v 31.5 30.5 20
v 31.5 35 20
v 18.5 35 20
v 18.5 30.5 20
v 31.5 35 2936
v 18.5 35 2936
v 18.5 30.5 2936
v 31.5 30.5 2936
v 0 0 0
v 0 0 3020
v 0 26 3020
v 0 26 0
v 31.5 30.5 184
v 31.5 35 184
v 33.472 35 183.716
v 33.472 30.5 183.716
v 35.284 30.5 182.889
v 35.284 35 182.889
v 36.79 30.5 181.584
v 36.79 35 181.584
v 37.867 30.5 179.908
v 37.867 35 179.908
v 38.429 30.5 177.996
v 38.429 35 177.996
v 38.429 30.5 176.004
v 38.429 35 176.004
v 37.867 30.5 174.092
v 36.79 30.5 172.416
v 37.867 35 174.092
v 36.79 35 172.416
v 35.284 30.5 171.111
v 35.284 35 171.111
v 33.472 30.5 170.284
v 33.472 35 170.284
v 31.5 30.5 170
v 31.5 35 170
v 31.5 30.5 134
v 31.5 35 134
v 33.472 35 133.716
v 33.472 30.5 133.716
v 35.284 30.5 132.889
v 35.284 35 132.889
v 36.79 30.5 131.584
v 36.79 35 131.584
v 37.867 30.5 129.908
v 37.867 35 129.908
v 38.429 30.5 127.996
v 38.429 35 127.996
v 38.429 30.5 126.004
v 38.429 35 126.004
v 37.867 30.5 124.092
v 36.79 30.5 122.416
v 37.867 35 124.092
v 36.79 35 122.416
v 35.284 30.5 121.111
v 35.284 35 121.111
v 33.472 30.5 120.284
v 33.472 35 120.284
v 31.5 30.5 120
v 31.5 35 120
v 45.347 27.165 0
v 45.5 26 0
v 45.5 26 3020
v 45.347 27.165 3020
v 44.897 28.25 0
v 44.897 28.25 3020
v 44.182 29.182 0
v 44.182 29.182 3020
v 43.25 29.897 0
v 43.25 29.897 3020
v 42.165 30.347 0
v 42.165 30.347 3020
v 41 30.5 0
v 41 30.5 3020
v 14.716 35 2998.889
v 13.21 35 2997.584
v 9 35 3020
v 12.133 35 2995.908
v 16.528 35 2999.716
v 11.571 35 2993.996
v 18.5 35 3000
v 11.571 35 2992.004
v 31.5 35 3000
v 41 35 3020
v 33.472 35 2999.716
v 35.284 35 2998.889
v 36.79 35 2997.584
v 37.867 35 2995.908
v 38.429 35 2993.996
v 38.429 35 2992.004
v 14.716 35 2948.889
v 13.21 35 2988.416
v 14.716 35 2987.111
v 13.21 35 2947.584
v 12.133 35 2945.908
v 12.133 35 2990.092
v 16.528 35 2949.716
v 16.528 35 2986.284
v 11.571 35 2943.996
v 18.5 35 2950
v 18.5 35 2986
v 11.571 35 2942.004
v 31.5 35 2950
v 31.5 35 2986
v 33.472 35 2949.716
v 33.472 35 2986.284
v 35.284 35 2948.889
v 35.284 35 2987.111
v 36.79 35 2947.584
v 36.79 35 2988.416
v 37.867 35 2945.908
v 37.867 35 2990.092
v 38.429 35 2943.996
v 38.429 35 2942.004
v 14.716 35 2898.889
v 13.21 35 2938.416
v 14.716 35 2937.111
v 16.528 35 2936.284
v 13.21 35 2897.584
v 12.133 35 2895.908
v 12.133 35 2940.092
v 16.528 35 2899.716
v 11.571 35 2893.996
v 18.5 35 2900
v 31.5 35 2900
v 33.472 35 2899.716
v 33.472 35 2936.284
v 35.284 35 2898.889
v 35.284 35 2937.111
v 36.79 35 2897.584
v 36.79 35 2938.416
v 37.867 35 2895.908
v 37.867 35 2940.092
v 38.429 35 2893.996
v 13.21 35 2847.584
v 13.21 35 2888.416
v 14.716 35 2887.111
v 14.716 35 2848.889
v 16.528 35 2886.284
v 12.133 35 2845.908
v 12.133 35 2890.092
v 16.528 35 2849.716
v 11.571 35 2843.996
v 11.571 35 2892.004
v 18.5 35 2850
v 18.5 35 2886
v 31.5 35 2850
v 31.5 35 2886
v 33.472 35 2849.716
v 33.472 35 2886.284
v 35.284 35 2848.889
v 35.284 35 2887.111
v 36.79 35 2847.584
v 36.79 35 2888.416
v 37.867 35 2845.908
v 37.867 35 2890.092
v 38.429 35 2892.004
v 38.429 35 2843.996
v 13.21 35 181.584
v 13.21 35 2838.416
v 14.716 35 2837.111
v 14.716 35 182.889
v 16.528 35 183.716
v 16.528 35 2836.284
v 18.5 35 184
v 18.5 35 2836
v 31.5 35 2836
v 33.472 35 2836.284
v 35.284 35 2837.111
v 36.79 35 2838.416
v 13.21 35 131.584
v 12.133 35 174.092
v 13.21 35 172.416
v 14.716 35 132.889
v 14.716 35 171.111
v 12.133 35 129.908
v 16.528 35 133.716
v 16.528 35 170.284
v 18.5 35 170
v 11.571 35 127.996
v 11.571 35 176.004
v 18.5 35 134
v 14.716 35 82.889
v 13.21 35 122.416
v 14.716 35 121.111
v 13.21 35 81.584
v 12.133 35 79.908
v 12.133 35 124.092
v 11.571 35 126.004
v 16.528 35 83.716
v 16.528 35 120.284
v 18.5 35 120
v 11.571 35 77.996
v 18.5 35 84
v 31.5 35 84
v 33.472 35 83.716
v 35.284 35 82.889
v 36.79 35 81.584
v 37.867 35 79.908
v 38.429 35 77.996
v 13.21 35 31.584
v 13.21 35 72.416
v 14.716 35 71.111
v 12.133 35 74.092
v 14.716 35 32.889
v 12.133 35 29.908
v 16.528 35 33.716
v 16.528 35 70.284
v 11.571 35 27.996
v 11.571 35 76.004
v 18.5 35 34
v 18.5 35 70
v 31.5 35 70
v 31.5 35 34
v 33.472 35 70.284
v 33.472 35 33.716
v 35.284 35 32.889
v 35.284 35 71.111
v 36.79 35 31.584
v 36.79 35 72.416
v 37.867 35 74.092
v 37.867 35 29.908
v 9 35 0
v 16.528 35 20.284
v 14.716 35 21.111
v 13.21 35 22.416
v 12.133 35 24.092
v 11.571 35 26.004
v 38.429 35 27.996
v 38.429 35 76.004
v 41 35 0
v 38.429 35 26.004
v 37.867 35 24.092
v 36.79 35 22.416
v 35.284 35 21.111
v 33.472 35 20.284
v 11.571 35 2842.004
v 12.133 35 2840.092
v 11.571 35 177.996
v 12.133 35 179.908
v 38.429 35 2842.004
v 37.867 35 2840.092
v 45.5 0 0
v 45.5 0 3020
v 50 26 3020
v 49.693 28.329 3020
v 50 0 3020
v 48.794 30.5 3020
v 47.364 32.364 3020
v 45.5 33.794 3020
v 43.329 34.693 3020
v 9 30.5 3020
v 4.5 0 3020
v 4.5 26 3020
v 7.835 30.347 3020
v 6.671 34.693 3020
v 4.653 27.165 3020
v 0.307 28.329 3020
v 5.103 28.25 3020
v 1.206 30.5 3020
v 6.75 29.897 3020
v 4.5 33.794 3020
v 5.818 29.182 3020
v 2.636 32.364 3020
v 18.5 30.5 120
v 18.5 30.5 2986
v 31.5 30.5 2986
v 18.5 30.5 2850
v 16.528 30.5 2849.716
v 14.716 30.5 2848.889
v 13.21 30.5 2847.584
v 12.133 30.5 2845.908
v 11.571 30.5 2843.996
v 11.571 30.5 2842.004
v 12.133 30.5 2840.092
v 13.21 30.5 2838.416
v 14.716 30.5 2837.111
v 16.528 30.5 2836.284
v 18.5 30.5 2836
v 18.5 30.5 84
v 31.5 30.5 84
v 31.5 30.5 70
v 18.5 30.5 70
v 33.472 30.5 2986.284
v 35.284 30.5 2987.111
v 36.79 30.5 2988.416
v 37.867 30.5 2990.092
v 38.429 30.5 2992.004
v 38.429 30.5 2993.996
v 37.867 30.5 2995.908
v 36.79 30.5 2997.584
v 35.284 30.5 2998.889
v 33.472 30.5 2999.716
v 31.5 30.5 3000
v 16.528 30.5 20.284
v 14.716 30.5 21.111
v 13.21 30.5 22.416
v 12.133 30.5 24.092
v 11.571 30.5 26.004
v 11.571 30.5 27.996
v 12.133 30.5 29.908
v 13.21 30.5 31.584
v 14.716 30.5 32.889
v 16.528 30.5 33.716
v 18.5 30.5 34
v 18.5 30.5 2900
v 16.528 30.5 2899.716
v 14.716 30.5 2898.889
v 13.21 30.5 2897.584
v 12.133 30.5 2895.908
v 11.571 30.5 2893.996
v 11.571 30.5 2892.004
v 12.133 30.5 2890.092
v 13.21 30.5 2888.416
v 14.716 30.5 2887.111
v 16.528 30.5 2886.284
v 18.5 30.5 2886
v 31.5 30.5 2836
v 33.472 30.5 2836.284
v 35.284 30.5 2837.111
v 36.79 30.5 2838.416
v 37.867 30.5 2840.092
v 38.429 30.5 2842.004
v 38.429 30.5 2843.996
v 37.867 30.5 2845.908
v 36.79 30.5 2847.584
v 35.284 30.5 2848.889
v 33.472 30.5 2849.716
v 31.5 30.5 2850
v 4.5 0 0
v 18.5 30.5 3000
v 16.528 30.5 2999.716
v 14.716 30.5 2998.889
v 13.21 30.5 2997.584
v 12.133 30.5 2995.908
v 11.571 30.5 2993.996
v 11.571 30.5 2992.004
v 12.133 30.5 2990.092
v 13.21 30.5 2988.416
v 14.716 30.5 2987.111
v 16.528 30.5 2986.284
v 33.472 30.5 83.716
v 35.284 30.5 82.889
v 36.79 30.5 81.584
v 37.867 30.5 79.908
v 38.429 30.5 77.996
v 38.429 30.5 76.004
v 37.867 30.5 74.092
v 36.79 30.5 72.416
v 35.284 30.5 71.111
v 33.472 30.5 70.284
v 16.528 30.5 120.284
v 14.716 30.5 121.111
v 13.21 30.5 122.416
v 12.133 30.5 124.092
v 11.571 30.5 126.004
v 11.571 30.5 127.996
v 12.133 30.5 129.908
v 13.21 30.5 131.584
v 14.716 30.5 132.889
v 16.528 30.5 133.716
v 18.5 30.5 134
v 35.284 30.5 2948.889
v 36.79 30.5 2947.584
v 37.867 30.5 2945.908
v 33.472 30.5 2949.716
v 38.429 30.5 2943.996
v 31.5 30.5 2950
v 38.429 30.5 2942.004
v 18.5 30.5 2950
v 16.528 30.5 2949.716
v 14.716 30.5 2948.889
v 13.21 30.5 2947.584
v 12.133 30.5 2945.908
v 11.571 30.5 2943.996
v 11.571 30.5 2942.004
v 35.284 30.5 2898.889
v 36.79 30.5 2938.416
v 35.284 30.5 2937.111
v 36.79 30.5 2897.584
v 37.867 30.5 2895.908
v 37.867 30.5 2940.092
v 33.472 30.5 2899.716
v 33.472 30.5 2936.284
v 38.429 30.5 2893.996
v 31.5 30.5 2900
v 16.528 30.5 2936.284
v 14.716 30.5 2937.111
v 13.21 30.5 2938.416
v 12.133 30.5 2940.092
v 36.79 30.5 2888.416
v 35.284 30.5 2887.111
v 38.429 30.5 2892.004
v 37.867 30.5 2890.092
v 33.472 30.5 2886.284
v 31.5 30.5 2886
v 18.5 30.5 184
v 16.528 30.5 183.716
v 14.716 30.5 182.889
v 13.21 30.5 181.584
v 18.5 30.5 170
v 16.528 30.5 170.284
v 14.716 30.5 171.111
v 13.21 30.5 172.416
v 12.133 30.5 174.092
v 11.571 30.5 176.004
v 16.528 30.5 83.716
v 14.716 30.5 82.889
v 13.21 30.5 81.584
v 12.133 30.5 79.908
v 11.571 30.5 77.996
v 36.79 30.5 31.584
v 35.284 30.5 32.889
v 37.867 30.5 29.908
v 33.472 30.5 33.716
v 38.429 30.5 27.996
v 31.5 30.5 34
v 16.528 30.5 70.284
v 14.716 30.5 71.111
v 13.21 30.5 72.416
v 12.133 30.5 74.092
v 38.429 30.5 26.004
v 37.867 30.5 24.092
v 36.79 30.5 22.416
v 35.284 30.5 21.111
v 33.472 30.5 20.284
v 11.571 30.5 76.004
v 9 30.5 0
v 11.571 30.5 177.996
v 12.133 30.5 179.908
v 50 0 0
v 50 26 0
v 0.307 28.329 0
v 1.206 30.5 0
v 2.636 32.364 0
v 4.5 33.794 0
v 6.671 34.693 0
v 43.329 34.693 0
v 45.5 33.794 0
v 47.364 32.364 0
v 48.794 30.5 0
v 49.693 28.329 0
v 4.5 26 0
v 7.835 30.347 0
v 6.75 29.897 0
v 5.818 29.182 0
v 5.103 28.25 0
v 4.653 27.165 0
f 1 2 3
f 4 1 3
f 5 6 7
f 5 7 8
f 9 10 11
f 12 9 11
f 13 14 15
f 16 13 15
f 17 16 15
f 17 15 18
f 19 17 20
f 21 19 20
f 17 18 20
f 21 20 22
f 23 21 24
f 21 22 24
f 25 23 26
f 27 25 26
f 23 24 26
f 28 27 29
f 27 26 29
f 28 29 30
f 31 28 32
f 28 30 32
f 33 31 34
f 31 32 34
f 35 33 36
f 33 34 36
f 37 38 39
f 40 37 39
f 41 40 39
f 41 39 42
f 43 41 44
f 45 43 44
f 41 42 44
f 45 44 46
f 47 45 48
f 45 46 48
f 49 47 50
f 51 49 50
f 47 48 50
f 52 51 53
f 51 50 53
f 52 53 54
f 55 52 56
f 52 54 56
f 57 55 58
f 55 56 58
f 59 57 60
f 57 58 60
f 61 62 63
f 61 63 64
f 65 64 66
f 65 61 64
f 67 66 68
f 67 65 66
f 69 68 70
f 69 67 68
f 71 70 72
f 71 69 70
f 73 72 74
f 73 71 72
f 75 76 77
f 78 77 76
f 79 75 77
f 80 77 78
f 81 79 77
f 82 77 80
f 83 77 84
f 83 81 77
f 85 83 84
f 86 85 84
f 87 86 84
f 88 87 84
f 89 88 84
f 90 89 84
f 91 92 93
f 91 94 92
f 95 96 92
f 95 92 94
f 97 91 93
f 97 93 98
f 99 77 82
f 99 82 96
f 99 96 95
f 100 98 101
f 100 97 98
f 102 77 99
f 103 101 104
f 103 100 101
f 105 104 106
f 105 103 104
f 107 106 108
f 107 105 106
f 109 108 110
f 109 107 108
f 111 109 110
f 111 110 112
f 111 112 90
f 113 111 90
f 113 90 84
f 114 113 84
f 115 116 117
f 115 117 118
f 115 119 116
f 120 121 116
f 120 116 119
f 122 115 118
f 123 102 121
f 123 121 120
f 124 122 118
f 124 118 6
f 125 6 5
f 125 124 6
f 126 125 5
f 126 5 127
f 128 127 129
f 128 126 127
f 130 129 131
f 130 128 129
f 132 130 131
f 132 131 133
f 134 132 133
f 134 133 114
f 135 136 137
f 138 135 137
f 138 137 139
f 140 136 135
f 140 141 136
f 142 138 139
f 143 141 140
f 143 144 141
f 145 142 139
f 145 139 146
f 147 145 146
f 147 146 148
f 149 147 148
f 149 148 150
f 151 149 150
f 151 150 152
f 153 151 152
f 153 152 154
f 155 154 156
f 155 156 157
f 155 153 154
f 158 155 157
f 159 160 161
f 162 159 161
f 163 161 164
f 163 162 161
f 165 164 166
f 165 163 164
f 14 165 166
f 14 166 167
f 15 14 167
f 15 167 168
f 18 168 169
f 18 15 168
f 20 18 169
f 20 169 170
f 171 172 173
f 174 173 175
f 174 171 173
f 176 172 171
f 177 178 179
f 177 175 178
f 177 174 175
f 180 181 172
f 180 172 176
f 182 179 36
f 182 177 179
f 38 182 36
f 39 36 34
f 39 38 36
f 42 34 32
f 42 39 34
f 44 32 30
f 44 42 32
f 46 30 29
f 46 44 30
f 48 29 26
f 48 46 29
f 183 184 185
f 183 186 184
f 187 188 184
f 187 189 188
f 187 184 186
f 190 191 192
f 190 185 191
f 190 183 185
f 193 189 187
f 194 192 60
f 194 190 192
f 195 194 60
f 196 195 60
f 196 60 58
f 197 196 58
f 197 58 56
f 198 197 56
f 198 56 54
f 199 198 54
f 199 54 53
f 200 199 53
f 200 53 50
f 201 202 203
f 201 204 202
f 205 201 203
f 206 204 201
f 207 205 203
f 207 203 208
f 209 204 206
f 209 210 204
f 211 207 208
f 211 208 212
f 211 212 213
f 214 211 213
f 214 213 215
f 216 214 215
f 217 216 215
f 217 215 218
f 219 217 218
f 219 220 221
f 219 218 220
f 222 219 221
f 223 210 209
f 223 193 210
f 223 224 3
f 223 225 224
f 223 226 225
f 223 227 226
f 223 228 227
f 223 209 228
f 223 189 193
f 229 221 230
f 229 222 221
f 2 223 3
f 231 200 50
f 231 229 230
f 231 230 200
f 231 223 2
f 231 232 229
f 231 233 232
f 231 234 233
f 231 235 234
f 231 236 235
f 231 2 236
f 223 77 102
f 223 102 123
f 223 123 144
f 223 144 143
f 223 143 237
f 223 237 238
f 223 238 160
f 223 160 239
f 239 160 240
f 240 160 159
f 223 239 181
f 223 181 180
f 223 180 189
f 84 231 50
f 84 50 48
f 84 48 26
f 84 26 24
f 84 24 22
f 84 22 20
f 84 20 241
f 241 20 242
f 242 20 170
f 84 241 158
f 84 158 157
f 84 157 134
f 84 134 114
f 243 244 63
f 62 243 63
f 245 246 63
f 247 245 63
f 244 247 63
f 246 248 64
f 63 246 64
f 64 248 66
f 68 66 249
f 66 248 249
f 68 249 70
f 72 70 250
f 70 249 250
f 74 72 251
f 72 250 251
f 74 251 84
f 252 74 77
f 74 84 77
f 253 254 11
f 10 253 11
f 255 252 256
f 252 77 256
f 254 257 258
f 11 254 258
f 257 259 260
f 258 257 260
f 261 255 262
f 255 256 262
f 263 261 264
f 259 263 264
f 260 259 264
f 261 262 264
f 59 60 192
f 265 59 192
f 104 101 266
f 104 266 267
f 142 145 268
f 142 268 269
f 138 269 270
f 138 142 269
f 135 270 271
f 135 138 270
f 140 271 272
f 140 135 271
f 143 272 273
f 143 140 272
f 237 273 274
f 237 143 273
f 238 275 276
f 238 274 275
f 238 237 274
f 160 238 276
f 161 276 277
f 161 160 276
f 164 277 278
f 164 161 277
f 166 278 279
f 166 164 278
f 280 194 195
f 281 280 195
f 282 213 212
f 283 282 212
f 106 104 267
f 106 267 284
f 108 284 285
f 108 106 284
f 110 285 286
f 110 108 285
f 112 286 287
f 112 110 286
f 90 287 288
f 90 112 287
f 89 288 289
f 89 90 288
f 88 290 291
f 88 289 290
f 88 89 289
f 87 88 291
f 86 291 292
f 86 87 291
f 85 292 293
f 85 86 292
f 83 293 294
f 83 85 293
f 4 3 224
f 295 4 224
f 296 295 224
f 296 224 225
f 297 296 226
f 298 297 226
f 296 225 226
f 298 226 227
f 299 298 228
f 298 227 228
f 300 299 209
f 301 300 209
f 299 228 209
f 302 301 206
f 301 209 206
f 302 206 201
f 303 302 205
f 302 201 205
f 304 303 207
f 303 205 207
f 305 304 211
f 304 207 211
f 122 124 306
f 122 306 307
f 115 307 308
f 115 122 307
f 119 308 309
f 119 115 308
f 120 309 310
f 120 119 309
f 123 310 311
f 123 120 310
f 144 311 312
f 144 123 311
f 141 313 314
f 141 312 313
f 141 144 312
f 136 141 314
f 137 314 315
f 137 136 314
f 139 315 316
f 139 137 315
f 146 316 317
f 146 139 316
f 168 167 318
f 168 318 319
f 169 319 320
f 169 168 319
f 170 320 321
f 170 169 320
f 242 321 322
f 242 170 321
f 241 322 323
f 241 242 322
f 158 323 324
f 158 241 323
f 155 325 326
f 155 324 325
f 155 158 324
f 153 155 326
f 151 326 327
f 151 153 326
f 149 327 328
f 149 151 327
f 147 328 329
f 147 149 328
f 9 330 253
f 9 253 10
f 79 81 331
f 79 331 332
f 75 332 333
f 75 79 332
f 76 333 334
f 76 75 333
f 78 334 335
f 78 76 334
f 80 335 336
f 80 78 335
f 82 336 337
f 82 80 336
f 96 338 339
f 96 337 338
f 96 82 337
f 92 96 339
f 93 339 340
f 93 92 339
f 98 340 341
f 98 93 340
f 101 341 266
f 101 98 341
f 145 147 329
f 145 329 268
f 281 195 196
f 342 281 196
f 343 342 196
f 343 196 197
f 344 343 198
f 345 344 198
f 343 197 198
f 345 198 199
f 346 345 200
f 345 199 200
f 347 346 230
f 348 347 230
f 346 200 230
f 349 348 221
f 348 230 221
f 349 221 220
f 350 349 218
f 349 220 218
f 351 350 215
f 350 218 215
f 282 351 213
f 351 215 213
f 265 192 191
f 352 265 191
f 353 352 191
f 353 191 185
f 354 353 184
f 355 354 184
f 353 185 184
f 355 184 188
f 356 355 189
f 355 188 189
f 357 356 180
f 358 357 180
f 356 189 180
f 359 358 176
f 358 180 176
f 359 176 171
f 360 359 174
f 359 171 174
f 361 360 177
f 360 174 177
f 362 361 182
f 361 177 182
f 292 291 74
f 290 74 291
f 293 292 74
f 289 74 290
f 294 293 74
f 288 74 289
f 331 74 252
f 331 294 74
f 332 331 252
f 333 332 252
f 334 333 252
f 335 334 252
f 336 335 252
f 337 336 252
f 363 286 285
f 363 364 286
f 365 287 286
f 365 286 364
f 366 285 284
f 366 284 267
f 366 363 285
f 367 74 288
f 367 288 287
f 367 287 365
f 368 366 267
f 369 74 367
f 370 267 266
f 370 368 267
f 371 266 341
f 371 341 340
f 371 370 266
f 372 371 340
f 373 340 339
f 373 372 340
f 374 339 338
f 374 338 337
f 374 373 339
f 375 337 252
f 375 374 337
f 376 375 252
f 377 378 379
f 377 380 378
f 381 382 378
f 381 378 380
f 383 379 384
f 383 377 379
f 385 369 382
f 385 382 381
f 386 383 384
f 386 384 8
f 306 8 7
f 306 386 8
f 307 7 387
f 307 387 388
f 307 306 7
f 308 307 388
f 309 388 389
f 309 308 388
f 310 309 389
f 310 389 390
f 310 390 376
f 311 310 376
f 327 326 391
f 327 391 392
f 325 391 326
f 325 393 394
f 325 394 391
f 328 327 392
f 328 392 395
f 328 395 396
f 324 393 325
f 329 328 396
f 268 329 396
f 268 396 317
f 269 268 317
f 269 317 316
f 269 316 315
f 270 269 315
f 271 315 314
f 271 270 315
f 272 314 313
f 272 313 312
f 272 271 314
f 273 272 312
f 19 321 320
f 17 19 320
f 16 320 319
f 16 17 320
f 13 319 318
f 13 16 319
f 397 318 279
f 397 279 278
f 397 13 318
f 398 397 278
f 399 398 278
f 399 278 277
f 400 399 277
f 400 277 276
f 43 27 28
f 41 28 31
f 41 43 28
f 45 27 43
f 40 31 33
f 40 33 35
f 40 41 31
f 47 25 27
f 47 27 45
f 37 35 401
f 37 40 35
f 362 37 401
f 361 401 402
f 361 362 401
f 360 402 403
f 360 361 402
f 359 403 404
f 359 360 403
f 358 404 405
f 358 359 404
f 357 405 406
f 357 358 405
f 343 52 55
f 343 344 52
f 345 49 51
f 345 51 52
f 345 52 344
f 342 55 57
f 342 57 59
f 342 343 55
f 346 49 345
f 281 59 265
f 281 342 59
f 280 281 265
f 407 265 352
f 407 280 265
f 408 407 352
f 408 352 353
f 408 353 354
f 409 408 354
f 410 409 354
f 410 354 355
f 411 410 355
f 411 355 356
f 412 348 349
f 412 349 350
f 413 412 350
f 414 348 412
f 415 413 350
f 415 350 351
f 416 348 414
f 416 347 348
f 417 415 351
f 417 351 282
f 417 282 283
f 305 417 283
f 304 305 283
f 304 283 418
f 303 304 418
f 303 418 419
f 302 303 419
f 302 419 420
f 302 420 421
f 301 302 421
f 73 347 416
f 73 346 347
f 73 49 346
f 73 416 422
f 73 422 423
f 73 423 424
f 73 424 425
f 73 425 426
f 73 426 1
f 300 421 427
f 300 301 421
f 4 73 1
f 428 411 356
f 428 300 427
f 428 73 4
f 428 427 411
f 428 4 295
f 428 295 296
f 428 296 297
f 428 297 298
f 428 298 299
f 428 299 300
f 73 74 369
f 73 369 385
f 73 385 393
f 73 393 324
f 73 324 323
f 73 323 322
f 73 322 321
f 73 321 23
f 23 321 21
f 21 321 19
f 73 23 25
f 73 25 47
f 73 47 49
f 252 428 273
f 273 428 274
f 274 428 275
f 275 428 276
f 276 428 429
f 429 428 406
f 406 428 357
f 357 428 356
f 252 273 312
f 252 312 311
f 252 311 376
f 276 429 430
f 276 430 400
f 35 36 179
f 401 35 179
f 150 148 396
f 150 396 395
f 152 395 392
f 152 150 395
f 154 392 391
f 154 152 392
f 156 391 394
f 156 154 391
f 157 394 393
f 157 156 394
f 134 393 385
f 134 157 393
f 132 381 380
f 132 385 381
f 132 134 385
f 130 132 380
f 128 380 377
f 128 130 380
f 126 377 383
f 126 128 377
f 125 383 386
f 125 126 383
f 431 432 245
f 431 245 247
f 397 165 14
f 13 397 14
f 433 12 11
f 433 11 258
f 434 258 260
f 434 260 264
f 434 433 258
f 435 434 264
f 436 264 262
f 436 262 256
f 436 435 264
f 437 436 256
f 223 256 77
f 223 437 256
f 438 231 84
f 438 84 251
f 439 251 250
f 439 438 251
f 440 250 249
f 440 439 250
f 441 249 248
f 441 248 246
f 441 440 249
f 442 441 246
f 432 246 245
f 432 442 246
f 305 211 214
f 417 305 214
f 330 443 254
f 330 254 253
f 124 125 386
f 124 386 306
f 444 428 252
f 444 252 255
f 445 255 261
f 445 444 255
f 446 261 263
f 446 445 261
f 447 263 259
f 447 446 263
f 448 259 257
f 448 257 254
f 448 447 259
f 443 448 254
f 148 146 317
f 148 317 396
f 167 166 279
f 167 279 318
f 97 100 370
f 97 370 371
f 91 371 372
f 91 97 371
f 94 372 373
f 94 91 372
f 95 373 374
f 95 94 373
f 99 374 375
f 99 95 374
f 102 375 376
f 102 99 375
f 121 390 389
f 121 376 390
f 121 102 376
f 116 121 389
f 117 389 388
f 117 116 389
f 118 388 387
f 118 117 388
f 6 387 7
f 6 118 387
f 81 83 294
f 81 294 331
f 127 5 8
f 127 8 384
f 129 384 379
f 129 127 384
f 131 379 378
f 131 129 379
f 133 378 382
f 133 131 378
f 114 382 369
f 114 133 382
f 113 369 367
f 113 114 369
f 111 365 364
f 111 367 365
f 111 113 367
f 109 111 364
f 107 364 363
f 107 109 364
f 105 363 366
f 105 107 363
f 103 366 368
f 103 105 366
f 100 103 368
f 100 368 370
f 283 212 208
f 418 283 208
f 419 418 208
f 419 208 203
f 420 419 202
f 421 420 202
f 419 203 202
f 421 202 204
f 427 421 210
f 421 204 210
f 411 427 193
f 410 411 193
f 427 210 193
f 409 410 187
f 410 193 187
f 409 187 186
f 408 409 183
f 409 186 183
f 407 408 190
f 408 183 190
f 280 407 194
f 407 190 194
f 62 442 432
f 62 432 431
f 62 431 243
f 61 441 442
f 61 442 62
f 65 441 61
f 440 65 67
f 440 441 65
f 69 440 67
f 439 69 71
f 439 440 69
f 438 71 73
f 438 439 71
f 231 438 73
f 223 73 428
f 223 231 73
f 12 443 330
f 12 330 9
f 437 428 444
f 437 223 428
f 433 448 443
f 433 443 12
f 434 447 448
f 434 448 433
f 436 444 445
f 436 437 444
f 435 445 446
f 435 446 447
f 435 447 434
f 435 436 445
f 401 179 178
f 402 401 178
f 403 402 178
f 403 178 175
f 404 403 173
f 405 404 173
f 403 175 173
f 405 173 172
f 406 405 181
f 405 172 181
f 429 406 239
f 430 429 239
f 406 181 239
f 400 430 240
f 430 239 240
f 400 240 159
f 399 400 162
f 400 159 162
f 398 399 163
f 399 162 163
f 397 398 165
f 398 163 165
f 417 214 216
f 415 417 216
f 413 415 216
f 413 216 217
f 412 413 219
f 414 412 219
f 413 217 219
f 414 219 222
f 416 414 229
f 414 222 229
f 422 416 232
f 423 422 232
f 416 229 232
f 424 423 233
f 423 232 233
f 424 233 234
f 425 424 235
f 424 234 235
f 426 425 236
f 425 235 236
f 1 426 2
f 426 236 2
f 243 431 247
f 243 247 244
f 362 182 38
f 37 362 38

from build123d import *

# Parameters (mm, degrees)
BASE_FLANGE1_DEPTH = 3020
CUT_EXTRUDE1_DEPTH = 3021.616658896


# Sheet-metal steps are written as plain solids
with BuildPart() as part:
    # Sketch1 → Base-Flange1 (new body)
    with BuildSketch(Plane.XY):
        with BuildLine():
            Line((0, 0), (0, 26))
            ThreePointArc((0, 26), (2.636038969, 32.363961031), (9, 35))
            Line((9, 35), (41, 35))
            ThreePointArc((41, 35), (47.363961031, 32.363961031), (50, 26))
            Line((50, 26), (50, 0))
            Line((50, 0), (45.5, 0))
            Line((45.5, 0), (45.5, 26))
            ThreePointArc((45.5, 26), (44.181980515, 29.181980515), (41, 30.5))
            Line((41, 30.5), (9, 30.5))
            ThreePointArc((9, 30.5), (5.818019485, 29.181980515), (4.5, 26))
            Line((4.5, 26), (4.5, 0))
            Line((4.5, 0), (0, 0))
        make_face()
    extrude(amount=BASE_FLANGE1_DEPTH)

    # Sketch6 → Cut-Extrude1 (cut, through all)
    with BuildSketch(Plane(origin=(0, 35, 0), x_dir=(1, 0, 0), z_dir=(0, 1, 0))):
        with BuildLine():
            Line((18.5, -2986), (31.5, -2986))
            ThreePointArc((31.5, -2986), (38.5, -2993), (31.5, -3000))
            Line((31.5, -3000), (18.5, -3000))
            ThreePointArc((18.5, -3000), (11.5, -2993), (18.5, -2986))
        make_face()
        with BuildLine():
            Line((18.5, -2936), (31.5, -2936))
            ThreePointArc((31.5, -2936), (38.5, -2943), (31.5, -2950))
            Line((31.5, -2950), (18.5, -2950))
            ThreePointArc((18.5, -2950), (11.5, -2943), (18.5, -2936))
        make_face()
        with BuildLine():
            Line((18.5, -2886), (31.5, -2886))
            ThreePointArc((31.5, -2886), (38.5, -2893), (31.5, -2900))
            Line((31.5, -2900), (18.5, -2900))
            ThreePointArc((18.5, -2900), (11.5, -2893), (18.5, -2886))
        make_face()
        with BuildLine():
            Line((18.5, -2836), (31.5, -2836))
            ThreePointArc((31.5, -2836), (38.5, -2843), (31.5, -2850))
            Line((31.5, -2850), (18.5, -2850))
            ThreePointArc((18.5, -2850), (11.5, -2843), (18.5, -2836))
        make_face()
        with BuildLine():
            Line((18.5, -34), (31.5, -34))
            ThreePointArc((31.5, -34), (38.5, -27), (31.5, -20))
            Line((31.5, -20), (18.5, -20))
            ThreePointArc((18.5, -20), (11.5, -27), (18.5, -34))
        make_face()
        with BuildLine():
            Line((18.5, -84), (31.5, -84))
            ThreePointArc((31.5, -84), (38.5, -77), (31.5, -70))
            Line((31.5, -70), (18.5, -70))
            ThreePointArc((18.5, -70), (11.5, -77), (18.5, -84))
        make_face()
        with BuildLine():
            Line((18.5, -134), (31.5, -134))
            ThreePointArc((31.5, -134), (38.5, -127), (31.5, -120))
            Line((31.5, -120), (18.5, -120))
            ThreePointArc((18.5, -120), (11.5, -127), (18.5, -134))
        make_face()
        with BuildLine():
            Line((18.5, -184), (31.5, -184))
            ThreePointArc((31.5, -184), (38.5, -177), (31.5, -170))
            Line((31.5, -170), (18.5, -170))
            ThreePointArc((18.5, -170), (11.5, -177), (18.5, -184))
        make_face()
    extrude(amount=-CUT_EXTRUDE1_DEPTH, mode=Mode.SUBTRACT)


solid = part.part
